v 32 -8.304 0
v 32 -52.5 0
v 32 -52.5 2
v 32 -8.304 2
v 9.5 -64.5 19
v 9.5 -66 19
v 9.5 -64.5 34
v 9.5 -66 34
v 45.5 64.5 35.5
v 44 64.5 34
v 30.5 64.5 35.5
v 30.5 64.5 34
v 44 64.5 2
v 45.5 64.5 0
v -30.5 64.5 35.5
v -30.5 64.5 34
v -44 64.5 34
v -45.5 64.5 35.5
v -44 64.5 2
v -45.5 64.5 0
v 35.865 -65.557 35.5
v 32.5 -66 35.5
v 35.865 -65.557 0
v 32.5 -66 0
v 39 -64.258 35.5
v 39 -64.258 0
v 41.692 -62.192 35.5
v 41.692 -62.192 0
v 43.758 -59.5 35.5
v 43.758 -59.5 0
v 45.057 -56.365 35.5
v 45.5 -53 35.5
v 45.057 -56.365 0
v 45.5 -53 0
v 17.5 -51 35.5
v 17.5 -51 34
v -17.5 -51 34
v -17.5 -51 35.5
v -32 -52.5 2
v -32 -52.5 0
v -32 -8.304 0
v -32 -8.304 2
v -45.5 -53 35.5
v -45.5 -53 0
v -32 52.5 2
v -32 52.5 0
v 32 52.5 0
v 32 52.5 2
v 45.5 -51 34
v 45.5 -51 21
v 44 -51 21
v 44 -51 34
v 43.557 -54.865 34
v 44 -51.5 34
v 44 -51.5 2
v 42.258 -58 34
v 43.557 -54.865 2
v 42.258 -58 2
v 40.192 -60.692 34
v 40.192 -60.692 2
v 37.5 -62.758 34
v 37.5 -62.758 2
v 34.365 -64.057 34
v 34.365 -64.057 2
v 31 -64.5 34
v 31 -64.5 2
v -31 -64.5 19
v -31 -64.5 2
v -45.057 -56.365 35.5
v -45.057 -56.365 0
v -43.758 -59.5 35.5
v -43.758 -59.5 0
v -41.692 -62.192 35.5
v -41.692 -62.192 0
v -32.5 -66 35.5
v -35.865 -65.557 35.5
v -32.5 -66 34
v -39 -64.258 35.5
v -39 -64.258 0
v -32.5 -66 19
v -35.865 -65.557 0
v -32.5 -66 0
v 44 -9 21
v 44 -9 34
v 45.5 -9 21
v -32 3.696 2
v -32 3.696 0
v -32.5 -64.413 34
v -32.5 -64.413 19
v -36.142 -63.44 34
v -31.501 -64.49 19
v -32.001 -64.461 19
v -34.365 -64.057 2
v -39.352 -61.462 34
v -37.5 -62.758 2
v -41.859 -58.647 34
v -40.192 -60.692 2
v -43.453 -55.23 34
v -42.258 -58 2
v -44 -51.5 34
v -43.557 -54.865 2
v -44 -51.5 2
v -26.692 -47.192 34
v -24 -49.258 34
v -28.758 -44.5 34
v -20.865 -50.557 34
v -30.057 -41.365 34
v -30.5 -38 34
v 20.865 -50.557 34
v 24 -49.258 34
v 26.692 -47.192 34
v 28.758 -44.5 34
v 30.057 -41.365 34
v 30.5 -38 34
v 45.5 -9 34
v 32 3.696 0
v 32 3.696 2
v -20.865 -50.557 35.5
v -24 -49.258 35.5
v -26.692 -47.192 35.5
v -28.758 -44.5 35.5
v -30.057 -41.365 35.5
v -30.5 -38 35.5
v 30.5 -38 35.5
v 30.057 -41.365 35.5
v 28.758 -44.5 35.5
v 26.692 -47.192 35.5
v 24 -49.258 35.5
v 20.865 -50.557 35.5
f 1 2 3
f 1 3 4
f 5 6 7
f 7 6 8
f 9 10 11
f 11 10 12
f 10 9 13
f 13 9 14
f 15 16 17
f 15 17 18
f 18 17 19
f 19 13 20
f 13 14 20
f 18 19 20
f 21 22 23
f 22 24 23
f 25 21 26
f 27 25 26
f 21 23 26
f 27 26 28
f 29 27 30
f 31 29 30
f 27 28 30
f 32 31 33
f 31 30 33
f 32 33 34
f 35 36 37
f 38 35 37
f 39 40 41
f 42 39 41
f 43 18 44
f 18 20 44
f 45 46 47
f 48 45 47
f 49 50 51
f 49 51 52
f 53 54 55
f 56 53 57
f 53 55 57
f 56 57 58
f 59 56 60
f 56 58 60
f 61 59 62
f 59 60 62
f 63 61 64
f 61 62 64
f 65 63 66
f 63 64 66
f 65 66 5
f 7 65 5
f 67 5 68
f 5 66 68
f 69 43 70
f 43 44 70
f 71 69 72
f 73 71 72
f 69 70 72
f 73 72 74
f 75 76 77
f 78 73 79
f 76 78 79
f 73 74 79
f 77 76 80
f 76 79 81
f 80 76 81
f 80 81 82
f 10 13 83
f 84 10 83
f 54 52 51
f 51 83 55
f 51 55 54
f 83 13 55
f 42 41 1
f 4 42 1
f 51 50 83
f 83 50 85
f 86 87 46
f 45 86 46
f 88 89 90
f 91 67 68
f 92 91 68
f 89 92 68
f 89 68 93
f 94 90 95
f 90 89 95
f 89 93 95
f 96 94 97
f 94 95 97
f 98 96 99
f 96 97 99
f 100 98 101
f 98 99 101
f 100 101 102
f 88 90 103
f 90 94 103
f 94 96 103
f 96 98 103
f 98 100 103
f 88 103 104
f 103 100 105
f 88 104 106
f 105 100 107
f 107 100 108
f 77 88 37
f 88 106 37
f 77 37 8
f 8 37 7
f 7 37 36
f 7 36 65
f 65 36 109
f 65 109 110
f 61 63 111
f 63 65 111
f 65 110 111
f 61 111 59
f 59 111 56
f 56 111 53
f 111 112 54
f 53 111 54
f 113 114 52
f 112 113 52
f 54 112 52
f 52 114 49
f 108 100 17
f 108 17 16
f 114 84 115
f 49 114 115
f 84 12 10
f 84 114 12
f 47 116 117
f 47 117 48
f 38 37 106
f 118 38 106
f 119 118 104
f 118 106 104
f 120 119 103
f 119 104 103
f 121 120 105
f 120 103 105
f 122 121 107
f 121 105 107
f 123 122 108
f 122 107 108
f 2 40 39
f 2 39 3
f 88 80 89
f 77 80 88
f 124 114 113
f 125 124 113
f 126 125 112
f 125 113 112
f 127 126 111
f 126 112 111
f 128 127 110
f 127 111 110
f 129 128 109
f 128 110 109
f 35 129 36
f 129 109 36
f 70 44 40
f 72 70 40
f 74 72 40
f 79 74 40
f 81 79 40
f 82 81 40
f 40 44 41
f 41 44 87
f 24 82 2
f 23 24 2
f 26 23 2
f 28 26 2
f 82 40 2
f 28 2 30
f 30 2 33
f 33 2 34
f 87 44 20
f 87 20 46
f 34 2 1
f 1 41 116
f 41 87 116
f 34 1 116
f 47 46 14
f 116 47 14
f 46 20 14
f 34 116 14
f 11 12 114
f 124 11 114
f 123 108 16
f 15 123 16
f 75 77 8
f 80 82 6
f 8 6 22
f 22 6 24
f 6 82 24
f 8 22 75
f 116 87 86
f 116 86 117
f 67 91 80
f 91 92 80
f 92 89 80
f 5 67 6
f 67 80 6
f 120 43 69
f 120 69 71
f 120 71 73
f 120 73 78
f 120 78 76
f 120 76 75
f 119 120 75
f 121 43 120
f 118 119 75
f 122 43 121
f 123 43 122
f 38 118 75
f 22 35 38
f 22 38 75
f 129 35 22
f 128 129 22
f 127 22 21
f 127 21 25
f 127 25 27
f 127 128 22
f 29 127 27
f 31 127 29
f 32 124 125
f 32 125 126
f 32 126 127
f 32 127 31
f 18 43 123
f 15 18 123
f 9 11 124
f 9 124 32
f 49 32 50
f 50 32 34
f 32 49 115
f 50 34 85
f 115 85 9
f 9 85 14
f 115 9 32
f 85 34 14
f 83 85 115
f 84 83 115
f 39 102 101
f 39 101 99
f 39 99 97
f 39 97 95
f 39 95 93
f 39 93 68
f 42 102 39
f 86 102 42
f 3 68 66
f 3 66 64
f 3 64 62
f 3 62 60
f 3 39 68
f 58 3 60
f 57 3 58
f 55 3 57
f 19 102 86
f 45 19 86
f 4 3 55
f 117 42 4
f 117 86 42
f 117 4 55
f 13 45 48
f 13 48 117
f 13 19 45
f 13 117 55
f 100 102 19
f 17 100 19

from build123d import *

# Parameters (mm, degrees)
F0_W     = 64
F0_H     = 44.1964381933
F0_H_2   = 48.8035618067
F1_DEPTH = 2
F2_DEPTH = 34
F3_W     = 42
F3_H     = 13
F4_DEPTH = 5
F5_W     = 42
F5_H     = 15
F6_DEPTH = 5
F7_W     = 1.5
F7_H     = 73.5
F8_DEPTH = 1.5


with BuildPart() as f1:
    # F0 (on Top) → F1 (new body)
    with BuildSketch(Plane.XY):
        with BuildLine():
            Line((-31, -64.5), (31, -64.5))
            ThreePointArc((31, -64.5), (40.1923881554, -60.6923881554), (44, -51.5))
            Line((44, -51.5), (44, 64.5))
            Line((44, 64.5), (-44, 64.5))
            Line((-44, 64.5), (-44, -51.5))
            ThreePointArc((-44, -51.5), (-40.1923881554, -60.6923881554), (-31, -64.5))
        make_face()
        with Locations((0, -30.4017809033)):
            Rectangle(F0_W, F0_H, mode=Mode.SUBTRACT)
        with Locations((0, 28.0982190967)):
            Rectangle(F0_W, F0_H_2, mode=Mode.SUBTRACT)
    extrude(amount=F1_DEPTH)

    # F0 (on Top) → F2 (join)
    with BuildSketch(Plane.XY):
        with BuildLine():
            ThreePointArc((44, -51.5), (40.1923881554, -60.6923881554), (31, -64.5))
            Line((31, -64.5), (-31, -64.5))
            ThreePointArc((-31, -64.5), (-40.1923881554, -60.6923881554), (-44, -51.5))
            Line((-44, -51.5), (-44, 64.5))
            Line((-44, 64.5), (-45.5, 64.5))
            Line((-45.5, 64.5), (-45.5, -53))
            ThreePointArc((-45.5, -53), (-41.6923881554, -62.1923881554), (-32.5, -66))
            Line((-32.5, -66), (32.5, -66))
            ThreePointArc((32.5, -66), (41.6923881554, -62.1923881554), (45.5, -53))
            Line((45.5, -53), (45.5, 64.5))
            Line((45.5, 64.5), (44, 64.5))
            Line((44, 64.5), (44, -51.5))
        make_face()
    extrude(amount=F2_DEPTH)

    # F3 (on face) → F4 (cut)
    with BuildSketch(Plane.YZ.offset(45.5)):
        with Locations((-30, 27.5)):
            Rectangle(F3_W, F3_H)
    extrude(amount=-F4_DEPTH, mode=Mode.SUBTRACT)

    # F5 (on face) → F6 (cut)
    with BuildSketch(Plane.XZ.offset(66)):
        with Locations((-11.5, 26.5)):
            Rectangle(F5_W, F5_H)
    extrude(amount=-F6_DEPTH, mode=Mode.SUBTRACT)

    # F7 (on face) → F8 (join)
    with BuildSketch(Plane.XY.offset(34)):
        with BuildLine():
            Line((44, -9), (44, 64.5))
            Line((44, 64.5), (30.5, 64.5))
            Line((30.5, 64.5), (30.5, 51))
            Line((30.5, 51), (30.5, -38))
            ThreePointArc((30.5, -38), (26.6923881554, -47.1923881554), (17.5, -51))
            Line((17.5, -51), (-17.5, -51))
            ThreePointArc((-17.5, -51), (-26.6923881554, -47.1923881554), (-30.5, -38))
            Line((-30.5, -38), (-30.5, 51))
            Line((-30.5, 51), (-30.5, 64.5))
            Line((-30.5, 64.5), (-45.5, 64.5))
            Line((-45.5, 64.5), (-45.5, -53))
            ThreePointArc((-45.5, -53), (-41.6923881554, -62.1923881554), (-32.5, -66))
            Line((-32.5, -66), (32.5, -66))
            ThreePointArc((32.5, -66), (41.6923881554, -62.1923881554), (45.5, -53))
            Line((45.5, -53), (45.5, -9))
            Line((45.5, -9), (44, -9))
        make_face()
        with Locations((44.75, 27.75)):
            Rectangle(F7_W, F7_H)
    extrude(amount=F8_DEPTH)


solid = f1.part
